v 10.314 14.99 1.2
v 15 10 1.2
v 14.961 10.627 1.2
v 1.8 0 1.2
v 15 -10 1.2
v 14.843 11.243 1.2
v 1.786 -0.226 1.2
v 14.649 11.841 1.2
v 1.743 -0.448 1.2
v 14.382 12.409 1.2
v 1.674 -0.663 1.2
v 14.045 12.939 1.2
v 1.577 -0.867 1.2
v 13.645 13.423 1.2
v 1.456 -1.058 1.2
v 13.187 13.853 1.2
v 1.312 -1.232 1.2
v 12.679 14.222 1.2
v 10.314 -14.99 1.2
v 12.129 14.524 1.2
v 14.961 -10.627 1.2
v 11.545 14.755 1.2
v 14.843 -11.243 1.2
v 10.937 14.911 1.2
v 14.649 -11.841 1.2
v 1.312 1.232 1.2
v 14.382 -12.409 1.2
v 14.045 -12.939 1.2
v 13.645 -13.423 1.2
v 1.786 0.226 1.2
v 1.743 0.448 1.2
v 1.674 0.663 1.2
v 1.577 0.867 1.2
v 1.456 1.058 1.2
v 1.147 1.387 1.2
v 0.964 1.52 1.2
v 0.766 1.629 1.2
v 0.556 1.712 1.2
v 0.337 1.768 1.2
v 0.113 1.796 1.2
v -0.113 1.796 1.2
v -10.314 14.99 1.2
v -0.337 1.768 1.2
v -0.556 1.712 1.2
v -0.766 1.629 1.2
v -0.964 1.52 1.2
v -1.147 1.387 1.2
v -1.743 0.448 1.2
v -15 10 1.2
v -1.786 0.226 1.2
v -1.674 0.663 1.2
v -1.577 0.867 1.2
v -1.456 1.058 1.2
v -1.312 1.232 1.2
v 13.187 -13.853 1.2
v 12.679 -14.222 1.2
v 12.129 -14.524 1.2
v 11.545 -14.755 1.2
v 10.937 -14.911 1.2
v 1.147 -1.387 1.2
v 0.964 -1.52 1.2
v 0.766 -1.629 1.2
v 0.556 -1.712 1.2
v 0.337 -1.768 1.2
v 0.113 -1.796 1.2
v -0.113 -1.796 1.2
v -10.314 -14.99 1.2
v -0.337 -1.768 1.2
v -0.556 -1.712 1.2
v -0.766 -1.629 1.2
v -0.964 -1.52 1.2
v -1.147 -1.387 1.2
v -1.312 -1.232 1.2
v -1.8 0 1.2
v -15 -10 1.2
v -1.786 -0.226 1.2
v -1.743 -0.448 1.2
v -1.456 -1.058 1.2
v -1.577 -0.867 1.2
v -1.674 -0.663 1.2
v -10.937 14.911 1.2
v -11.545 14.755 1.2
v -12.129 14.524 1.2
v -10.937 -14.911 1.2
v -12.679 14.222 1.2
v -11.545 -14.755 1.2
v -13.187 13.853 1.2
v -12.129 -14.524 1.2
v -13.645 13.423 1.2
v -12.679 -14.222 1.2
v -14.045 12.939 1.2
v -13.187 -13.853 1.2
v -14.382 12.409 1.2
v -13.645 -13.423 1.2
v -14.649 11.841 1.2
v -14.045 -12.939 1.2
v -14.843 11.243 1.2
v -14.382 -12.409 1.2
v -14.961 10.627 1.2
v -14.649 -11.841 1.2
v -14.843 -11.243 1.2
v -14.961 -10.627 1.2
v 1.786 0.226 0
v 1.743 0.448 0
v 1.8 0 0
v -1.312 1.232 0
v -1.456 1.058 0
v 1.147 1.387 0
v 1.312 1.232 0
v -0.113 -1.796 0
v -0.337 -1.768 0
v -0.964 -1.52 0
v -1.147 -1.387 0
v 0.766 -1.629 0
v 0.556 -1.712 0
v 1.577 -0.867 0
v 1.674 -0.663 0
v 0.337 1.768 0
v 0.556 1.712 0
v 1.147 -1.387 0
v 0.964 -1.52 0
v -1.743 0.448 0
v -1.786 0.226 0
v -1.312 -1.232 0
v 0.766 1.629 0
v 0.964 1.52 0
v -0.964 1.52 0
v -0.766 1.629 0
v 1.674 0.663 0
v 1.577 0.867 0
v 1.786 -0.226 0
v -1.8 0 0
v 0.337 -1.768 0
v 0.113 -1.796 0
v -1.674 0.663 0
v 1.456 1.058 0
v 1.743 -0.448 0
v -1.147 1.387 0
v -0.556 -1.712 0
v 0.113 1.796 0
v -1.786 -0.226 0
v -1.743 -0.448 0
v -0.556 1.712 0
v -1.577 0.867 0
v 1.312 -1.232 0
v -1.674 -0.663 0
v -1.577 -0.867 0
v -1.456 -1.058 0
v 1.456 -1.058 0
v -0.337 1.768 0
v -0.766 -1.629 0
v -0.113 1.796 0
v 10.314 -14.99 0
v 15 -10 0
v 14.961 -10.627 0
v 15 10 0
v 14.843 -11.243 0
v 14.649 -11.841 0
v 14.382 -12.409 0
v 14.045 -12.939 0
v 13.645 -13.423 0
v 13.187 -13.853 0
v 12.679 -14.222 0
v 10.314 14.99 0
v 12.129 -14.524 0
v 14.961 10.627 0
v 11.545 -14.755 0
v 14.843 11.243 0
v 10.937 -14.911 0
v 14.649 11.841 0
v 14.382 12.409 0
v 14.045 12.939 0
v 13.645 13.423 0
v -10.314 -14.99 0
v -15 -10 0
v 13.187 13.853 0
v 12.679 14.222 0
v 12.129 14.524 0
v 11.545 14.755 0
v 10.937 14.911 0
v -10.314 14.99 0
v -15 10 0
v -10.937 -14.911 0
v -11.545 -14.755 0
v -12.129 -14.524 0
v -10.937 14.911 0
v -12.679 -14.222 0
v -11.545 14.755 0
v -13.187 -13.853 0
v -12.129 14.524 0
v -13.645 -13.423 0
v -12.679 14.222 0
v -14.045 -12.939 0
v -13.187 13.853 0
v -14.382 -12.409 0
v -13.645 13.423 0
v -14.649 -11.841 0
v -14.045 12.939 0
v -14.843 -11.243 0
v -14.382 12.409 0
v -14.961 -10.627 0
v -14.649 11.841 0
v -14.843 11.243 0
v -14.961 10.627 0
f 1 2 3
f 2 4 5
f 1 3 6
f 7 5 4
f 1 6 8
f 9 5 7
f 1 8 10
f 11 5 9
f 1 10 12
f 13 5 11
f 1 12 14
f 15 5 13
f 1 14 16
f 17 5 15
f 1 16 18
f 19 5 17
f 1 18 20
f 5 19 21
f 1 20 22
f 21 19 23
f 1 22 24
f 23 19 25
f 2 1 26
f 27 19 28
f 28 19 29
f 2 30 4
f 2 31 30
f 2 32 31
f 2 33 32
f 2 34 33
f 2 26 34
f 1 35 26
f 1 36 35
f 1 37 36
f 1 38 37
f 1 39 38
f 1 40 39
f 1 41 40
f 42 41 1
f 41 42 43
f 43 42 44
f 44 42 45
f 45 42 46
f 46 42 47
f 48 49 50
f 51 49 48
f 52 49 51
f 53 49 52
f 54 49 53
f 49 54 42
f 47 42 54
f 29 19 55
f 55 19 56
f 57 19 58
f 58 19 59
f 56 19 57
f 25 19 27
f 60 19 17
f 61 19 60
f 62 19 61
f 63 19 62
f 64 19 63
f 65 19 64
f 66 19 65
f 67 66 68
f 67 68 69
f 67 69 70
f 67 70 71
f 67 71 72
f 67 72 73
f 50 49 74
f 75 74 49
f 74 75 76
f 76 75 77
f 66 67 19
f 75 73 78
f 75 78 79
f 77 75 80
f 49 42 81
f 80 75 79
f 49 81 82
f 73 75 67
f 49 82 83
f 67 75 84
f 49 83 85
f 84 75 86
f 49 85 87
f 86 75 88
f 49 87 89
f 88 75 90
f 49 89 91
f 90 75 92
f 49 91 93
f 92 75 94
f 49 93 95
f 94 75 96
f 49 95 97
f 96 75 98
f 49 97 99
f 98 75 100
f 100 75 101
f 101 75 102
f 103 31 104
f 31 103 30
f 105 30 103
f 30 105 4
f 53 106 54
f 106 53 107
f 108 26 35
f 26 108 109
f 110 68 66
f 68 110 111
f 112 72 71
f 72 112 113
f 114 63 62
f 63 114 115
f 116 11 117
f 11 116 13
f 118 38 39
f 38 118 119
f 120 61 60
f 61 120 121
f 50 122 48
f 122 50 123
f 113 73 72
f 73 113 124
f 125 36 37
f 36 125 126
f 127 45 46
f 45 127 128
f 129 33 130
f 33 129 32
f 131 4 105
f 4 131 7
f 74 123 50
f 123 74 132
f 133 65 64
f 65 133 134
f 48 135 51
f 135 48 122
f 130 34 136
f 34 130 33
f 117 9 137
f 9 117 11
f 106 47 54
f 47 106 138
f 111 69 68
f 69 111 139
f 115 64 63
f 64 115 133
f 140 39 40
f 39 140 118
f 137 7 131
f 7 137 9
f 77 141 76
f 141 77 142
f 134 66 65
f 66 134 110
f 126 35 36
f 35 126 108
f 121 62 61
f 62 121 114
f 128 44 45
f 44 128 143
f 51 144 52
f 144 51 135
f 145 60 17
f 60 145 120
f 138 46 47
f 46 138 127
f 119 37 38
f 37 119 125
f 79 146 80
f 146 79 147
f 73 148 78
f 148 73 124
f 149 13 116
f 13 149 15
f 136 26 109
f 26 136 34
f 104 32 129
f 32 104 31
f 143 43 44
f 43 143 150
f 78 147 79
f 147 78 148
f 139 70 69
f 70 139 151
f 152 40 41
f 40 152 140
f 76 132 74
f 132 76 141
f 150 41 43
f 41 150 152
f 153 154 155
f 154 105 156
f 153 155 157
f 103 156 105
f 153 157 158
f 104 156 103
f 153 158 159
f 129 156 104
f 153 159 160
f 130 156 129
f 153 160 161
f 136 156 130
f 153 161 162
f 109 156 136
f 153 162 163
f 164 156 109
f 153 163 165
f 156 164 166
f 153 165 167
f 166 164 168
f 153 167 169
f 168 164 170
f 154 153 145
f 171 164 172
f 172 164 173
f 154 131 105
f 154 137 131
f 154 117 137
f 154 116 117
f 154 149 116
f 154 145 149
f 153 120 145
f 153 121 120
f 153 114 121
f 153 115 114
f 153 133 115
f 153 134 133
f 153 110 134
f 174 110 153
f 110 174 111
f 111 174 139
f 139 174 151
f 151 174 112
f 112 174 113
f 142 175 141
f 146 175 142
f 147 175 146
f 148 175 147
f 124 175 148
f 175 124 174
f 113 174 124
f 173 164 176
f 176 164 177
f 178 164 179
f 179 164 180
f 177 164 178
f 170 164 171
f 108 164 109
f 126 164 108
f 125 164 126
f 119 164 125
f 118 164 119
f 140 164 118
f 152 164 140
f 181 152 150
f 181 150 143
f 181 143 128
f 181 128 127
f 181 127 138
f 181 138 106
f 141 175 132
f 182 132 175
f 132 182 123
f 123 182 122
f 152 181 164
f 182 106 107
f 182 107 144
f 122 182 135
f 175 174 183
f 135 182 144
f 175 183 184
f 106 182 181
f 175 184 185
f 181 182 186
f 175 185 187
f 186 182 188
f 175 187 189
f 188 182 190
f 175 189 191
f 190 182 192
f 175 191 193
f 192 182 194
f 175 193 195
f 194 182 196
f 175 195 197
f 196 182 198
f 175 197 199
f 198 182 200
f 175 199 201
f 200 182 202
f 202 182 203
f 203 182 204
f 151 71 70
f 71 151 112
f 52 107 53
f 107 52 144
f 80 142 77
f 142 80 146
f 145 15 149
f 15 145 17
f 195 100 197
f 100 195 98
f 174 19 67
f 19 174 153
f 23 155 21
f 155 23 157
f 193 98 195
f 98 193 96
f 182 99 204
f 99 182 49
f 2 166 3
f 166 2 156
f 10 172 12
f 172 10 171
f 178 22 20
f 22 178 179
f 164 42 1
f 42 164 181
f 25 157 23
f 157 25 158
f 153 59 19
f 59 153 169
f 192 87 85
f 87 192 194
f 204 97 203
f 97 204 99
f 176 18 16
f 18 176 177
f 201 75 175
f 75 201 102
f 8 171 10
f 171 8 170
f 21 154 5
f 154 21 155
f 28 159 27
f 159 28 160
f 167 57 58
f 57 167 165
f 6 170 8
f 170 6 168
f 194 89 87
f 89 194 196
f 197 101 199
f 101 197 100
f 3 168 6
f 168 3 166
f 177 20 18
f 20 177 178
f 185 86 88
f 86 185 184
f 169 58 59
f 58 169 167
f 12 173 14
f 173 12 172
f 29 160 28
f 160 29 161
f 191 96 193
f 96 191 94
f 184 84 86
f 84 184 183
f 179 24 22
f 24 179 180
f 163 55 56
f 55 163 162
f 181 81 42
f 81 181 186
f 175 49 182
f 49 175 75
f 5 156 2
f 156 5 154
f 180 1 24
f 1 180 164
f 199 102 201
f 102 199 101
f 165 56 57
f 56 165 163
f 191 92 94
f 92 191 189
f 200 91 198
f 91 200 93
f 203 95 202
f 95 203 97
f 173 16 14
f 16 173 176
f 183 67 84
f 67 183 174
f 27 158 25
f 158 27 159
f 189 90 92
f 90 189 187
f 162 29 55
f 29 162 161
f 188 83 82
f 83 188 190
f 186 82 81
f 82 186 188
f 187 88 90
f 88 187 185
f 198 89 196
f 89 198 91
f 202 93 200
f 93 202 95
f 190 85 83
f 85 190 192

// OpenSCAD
$fn = 50;


difference() {
	union() {
		hull() {
			translate(v = [-10.0000000000, 10.0000000000, 0]) {
				cylinder(h = 30, r = 5);
			}
			translate(v = [10.0000000000, 10.0000000000, 0]) {
				cylinder(h = 30, r = 5);
			}
			translate(v = [-10.0000000000, -10.0000000000, 0]) {
				cylinder(h = 30, r = 5);
			}
			translate(v = [10.0000000000, -10.0000000000, 0]) {
				cylinder(h = 30, r = 5);
			}
		}
	}
	union() {
		translate(v = [0, 0, 1.2000000000]) {
			hull() {
				translate(v = [-10.0000000000, 10.0000000000, 0]) {
					cylinder(h = 28.8000000000, r = 3.8000000000);
				}
				translate(v = [10.0000000000, 10.0000000000, 0]) {
					cylinder(h = 28.8000000000, r = 3.8000000000);
				}
				translate(v = [-10.0000000000, -10.0000000000, 0]) {
					cylinder(h = 28.8000000000, r = 3.8000000000);
				}
				translate(v = [10.0000000000, -10.0000000000, 0]) {
					cylinder(h = 28.8000000000, r = 3.8000000000);
				}
			}
		}
		#cylinder(h = 1.2000000000, r = 1.8000000000);
		translate(v = [-250.0000000000, -250.0000000000, 1.2000000000]) {
			cube(size = [500, 500, 500]);
		}
		translate(v = [-250.0000000000, -250.0000000000, 1.2000000000]) {
			cube(size = [500, 500, 500]);
		}
		translate(v = [-250.0000000000, -250.0000000000, 1.2000000000]) {
			cube(size = [500, 500, 500]);
		}
	}
}
